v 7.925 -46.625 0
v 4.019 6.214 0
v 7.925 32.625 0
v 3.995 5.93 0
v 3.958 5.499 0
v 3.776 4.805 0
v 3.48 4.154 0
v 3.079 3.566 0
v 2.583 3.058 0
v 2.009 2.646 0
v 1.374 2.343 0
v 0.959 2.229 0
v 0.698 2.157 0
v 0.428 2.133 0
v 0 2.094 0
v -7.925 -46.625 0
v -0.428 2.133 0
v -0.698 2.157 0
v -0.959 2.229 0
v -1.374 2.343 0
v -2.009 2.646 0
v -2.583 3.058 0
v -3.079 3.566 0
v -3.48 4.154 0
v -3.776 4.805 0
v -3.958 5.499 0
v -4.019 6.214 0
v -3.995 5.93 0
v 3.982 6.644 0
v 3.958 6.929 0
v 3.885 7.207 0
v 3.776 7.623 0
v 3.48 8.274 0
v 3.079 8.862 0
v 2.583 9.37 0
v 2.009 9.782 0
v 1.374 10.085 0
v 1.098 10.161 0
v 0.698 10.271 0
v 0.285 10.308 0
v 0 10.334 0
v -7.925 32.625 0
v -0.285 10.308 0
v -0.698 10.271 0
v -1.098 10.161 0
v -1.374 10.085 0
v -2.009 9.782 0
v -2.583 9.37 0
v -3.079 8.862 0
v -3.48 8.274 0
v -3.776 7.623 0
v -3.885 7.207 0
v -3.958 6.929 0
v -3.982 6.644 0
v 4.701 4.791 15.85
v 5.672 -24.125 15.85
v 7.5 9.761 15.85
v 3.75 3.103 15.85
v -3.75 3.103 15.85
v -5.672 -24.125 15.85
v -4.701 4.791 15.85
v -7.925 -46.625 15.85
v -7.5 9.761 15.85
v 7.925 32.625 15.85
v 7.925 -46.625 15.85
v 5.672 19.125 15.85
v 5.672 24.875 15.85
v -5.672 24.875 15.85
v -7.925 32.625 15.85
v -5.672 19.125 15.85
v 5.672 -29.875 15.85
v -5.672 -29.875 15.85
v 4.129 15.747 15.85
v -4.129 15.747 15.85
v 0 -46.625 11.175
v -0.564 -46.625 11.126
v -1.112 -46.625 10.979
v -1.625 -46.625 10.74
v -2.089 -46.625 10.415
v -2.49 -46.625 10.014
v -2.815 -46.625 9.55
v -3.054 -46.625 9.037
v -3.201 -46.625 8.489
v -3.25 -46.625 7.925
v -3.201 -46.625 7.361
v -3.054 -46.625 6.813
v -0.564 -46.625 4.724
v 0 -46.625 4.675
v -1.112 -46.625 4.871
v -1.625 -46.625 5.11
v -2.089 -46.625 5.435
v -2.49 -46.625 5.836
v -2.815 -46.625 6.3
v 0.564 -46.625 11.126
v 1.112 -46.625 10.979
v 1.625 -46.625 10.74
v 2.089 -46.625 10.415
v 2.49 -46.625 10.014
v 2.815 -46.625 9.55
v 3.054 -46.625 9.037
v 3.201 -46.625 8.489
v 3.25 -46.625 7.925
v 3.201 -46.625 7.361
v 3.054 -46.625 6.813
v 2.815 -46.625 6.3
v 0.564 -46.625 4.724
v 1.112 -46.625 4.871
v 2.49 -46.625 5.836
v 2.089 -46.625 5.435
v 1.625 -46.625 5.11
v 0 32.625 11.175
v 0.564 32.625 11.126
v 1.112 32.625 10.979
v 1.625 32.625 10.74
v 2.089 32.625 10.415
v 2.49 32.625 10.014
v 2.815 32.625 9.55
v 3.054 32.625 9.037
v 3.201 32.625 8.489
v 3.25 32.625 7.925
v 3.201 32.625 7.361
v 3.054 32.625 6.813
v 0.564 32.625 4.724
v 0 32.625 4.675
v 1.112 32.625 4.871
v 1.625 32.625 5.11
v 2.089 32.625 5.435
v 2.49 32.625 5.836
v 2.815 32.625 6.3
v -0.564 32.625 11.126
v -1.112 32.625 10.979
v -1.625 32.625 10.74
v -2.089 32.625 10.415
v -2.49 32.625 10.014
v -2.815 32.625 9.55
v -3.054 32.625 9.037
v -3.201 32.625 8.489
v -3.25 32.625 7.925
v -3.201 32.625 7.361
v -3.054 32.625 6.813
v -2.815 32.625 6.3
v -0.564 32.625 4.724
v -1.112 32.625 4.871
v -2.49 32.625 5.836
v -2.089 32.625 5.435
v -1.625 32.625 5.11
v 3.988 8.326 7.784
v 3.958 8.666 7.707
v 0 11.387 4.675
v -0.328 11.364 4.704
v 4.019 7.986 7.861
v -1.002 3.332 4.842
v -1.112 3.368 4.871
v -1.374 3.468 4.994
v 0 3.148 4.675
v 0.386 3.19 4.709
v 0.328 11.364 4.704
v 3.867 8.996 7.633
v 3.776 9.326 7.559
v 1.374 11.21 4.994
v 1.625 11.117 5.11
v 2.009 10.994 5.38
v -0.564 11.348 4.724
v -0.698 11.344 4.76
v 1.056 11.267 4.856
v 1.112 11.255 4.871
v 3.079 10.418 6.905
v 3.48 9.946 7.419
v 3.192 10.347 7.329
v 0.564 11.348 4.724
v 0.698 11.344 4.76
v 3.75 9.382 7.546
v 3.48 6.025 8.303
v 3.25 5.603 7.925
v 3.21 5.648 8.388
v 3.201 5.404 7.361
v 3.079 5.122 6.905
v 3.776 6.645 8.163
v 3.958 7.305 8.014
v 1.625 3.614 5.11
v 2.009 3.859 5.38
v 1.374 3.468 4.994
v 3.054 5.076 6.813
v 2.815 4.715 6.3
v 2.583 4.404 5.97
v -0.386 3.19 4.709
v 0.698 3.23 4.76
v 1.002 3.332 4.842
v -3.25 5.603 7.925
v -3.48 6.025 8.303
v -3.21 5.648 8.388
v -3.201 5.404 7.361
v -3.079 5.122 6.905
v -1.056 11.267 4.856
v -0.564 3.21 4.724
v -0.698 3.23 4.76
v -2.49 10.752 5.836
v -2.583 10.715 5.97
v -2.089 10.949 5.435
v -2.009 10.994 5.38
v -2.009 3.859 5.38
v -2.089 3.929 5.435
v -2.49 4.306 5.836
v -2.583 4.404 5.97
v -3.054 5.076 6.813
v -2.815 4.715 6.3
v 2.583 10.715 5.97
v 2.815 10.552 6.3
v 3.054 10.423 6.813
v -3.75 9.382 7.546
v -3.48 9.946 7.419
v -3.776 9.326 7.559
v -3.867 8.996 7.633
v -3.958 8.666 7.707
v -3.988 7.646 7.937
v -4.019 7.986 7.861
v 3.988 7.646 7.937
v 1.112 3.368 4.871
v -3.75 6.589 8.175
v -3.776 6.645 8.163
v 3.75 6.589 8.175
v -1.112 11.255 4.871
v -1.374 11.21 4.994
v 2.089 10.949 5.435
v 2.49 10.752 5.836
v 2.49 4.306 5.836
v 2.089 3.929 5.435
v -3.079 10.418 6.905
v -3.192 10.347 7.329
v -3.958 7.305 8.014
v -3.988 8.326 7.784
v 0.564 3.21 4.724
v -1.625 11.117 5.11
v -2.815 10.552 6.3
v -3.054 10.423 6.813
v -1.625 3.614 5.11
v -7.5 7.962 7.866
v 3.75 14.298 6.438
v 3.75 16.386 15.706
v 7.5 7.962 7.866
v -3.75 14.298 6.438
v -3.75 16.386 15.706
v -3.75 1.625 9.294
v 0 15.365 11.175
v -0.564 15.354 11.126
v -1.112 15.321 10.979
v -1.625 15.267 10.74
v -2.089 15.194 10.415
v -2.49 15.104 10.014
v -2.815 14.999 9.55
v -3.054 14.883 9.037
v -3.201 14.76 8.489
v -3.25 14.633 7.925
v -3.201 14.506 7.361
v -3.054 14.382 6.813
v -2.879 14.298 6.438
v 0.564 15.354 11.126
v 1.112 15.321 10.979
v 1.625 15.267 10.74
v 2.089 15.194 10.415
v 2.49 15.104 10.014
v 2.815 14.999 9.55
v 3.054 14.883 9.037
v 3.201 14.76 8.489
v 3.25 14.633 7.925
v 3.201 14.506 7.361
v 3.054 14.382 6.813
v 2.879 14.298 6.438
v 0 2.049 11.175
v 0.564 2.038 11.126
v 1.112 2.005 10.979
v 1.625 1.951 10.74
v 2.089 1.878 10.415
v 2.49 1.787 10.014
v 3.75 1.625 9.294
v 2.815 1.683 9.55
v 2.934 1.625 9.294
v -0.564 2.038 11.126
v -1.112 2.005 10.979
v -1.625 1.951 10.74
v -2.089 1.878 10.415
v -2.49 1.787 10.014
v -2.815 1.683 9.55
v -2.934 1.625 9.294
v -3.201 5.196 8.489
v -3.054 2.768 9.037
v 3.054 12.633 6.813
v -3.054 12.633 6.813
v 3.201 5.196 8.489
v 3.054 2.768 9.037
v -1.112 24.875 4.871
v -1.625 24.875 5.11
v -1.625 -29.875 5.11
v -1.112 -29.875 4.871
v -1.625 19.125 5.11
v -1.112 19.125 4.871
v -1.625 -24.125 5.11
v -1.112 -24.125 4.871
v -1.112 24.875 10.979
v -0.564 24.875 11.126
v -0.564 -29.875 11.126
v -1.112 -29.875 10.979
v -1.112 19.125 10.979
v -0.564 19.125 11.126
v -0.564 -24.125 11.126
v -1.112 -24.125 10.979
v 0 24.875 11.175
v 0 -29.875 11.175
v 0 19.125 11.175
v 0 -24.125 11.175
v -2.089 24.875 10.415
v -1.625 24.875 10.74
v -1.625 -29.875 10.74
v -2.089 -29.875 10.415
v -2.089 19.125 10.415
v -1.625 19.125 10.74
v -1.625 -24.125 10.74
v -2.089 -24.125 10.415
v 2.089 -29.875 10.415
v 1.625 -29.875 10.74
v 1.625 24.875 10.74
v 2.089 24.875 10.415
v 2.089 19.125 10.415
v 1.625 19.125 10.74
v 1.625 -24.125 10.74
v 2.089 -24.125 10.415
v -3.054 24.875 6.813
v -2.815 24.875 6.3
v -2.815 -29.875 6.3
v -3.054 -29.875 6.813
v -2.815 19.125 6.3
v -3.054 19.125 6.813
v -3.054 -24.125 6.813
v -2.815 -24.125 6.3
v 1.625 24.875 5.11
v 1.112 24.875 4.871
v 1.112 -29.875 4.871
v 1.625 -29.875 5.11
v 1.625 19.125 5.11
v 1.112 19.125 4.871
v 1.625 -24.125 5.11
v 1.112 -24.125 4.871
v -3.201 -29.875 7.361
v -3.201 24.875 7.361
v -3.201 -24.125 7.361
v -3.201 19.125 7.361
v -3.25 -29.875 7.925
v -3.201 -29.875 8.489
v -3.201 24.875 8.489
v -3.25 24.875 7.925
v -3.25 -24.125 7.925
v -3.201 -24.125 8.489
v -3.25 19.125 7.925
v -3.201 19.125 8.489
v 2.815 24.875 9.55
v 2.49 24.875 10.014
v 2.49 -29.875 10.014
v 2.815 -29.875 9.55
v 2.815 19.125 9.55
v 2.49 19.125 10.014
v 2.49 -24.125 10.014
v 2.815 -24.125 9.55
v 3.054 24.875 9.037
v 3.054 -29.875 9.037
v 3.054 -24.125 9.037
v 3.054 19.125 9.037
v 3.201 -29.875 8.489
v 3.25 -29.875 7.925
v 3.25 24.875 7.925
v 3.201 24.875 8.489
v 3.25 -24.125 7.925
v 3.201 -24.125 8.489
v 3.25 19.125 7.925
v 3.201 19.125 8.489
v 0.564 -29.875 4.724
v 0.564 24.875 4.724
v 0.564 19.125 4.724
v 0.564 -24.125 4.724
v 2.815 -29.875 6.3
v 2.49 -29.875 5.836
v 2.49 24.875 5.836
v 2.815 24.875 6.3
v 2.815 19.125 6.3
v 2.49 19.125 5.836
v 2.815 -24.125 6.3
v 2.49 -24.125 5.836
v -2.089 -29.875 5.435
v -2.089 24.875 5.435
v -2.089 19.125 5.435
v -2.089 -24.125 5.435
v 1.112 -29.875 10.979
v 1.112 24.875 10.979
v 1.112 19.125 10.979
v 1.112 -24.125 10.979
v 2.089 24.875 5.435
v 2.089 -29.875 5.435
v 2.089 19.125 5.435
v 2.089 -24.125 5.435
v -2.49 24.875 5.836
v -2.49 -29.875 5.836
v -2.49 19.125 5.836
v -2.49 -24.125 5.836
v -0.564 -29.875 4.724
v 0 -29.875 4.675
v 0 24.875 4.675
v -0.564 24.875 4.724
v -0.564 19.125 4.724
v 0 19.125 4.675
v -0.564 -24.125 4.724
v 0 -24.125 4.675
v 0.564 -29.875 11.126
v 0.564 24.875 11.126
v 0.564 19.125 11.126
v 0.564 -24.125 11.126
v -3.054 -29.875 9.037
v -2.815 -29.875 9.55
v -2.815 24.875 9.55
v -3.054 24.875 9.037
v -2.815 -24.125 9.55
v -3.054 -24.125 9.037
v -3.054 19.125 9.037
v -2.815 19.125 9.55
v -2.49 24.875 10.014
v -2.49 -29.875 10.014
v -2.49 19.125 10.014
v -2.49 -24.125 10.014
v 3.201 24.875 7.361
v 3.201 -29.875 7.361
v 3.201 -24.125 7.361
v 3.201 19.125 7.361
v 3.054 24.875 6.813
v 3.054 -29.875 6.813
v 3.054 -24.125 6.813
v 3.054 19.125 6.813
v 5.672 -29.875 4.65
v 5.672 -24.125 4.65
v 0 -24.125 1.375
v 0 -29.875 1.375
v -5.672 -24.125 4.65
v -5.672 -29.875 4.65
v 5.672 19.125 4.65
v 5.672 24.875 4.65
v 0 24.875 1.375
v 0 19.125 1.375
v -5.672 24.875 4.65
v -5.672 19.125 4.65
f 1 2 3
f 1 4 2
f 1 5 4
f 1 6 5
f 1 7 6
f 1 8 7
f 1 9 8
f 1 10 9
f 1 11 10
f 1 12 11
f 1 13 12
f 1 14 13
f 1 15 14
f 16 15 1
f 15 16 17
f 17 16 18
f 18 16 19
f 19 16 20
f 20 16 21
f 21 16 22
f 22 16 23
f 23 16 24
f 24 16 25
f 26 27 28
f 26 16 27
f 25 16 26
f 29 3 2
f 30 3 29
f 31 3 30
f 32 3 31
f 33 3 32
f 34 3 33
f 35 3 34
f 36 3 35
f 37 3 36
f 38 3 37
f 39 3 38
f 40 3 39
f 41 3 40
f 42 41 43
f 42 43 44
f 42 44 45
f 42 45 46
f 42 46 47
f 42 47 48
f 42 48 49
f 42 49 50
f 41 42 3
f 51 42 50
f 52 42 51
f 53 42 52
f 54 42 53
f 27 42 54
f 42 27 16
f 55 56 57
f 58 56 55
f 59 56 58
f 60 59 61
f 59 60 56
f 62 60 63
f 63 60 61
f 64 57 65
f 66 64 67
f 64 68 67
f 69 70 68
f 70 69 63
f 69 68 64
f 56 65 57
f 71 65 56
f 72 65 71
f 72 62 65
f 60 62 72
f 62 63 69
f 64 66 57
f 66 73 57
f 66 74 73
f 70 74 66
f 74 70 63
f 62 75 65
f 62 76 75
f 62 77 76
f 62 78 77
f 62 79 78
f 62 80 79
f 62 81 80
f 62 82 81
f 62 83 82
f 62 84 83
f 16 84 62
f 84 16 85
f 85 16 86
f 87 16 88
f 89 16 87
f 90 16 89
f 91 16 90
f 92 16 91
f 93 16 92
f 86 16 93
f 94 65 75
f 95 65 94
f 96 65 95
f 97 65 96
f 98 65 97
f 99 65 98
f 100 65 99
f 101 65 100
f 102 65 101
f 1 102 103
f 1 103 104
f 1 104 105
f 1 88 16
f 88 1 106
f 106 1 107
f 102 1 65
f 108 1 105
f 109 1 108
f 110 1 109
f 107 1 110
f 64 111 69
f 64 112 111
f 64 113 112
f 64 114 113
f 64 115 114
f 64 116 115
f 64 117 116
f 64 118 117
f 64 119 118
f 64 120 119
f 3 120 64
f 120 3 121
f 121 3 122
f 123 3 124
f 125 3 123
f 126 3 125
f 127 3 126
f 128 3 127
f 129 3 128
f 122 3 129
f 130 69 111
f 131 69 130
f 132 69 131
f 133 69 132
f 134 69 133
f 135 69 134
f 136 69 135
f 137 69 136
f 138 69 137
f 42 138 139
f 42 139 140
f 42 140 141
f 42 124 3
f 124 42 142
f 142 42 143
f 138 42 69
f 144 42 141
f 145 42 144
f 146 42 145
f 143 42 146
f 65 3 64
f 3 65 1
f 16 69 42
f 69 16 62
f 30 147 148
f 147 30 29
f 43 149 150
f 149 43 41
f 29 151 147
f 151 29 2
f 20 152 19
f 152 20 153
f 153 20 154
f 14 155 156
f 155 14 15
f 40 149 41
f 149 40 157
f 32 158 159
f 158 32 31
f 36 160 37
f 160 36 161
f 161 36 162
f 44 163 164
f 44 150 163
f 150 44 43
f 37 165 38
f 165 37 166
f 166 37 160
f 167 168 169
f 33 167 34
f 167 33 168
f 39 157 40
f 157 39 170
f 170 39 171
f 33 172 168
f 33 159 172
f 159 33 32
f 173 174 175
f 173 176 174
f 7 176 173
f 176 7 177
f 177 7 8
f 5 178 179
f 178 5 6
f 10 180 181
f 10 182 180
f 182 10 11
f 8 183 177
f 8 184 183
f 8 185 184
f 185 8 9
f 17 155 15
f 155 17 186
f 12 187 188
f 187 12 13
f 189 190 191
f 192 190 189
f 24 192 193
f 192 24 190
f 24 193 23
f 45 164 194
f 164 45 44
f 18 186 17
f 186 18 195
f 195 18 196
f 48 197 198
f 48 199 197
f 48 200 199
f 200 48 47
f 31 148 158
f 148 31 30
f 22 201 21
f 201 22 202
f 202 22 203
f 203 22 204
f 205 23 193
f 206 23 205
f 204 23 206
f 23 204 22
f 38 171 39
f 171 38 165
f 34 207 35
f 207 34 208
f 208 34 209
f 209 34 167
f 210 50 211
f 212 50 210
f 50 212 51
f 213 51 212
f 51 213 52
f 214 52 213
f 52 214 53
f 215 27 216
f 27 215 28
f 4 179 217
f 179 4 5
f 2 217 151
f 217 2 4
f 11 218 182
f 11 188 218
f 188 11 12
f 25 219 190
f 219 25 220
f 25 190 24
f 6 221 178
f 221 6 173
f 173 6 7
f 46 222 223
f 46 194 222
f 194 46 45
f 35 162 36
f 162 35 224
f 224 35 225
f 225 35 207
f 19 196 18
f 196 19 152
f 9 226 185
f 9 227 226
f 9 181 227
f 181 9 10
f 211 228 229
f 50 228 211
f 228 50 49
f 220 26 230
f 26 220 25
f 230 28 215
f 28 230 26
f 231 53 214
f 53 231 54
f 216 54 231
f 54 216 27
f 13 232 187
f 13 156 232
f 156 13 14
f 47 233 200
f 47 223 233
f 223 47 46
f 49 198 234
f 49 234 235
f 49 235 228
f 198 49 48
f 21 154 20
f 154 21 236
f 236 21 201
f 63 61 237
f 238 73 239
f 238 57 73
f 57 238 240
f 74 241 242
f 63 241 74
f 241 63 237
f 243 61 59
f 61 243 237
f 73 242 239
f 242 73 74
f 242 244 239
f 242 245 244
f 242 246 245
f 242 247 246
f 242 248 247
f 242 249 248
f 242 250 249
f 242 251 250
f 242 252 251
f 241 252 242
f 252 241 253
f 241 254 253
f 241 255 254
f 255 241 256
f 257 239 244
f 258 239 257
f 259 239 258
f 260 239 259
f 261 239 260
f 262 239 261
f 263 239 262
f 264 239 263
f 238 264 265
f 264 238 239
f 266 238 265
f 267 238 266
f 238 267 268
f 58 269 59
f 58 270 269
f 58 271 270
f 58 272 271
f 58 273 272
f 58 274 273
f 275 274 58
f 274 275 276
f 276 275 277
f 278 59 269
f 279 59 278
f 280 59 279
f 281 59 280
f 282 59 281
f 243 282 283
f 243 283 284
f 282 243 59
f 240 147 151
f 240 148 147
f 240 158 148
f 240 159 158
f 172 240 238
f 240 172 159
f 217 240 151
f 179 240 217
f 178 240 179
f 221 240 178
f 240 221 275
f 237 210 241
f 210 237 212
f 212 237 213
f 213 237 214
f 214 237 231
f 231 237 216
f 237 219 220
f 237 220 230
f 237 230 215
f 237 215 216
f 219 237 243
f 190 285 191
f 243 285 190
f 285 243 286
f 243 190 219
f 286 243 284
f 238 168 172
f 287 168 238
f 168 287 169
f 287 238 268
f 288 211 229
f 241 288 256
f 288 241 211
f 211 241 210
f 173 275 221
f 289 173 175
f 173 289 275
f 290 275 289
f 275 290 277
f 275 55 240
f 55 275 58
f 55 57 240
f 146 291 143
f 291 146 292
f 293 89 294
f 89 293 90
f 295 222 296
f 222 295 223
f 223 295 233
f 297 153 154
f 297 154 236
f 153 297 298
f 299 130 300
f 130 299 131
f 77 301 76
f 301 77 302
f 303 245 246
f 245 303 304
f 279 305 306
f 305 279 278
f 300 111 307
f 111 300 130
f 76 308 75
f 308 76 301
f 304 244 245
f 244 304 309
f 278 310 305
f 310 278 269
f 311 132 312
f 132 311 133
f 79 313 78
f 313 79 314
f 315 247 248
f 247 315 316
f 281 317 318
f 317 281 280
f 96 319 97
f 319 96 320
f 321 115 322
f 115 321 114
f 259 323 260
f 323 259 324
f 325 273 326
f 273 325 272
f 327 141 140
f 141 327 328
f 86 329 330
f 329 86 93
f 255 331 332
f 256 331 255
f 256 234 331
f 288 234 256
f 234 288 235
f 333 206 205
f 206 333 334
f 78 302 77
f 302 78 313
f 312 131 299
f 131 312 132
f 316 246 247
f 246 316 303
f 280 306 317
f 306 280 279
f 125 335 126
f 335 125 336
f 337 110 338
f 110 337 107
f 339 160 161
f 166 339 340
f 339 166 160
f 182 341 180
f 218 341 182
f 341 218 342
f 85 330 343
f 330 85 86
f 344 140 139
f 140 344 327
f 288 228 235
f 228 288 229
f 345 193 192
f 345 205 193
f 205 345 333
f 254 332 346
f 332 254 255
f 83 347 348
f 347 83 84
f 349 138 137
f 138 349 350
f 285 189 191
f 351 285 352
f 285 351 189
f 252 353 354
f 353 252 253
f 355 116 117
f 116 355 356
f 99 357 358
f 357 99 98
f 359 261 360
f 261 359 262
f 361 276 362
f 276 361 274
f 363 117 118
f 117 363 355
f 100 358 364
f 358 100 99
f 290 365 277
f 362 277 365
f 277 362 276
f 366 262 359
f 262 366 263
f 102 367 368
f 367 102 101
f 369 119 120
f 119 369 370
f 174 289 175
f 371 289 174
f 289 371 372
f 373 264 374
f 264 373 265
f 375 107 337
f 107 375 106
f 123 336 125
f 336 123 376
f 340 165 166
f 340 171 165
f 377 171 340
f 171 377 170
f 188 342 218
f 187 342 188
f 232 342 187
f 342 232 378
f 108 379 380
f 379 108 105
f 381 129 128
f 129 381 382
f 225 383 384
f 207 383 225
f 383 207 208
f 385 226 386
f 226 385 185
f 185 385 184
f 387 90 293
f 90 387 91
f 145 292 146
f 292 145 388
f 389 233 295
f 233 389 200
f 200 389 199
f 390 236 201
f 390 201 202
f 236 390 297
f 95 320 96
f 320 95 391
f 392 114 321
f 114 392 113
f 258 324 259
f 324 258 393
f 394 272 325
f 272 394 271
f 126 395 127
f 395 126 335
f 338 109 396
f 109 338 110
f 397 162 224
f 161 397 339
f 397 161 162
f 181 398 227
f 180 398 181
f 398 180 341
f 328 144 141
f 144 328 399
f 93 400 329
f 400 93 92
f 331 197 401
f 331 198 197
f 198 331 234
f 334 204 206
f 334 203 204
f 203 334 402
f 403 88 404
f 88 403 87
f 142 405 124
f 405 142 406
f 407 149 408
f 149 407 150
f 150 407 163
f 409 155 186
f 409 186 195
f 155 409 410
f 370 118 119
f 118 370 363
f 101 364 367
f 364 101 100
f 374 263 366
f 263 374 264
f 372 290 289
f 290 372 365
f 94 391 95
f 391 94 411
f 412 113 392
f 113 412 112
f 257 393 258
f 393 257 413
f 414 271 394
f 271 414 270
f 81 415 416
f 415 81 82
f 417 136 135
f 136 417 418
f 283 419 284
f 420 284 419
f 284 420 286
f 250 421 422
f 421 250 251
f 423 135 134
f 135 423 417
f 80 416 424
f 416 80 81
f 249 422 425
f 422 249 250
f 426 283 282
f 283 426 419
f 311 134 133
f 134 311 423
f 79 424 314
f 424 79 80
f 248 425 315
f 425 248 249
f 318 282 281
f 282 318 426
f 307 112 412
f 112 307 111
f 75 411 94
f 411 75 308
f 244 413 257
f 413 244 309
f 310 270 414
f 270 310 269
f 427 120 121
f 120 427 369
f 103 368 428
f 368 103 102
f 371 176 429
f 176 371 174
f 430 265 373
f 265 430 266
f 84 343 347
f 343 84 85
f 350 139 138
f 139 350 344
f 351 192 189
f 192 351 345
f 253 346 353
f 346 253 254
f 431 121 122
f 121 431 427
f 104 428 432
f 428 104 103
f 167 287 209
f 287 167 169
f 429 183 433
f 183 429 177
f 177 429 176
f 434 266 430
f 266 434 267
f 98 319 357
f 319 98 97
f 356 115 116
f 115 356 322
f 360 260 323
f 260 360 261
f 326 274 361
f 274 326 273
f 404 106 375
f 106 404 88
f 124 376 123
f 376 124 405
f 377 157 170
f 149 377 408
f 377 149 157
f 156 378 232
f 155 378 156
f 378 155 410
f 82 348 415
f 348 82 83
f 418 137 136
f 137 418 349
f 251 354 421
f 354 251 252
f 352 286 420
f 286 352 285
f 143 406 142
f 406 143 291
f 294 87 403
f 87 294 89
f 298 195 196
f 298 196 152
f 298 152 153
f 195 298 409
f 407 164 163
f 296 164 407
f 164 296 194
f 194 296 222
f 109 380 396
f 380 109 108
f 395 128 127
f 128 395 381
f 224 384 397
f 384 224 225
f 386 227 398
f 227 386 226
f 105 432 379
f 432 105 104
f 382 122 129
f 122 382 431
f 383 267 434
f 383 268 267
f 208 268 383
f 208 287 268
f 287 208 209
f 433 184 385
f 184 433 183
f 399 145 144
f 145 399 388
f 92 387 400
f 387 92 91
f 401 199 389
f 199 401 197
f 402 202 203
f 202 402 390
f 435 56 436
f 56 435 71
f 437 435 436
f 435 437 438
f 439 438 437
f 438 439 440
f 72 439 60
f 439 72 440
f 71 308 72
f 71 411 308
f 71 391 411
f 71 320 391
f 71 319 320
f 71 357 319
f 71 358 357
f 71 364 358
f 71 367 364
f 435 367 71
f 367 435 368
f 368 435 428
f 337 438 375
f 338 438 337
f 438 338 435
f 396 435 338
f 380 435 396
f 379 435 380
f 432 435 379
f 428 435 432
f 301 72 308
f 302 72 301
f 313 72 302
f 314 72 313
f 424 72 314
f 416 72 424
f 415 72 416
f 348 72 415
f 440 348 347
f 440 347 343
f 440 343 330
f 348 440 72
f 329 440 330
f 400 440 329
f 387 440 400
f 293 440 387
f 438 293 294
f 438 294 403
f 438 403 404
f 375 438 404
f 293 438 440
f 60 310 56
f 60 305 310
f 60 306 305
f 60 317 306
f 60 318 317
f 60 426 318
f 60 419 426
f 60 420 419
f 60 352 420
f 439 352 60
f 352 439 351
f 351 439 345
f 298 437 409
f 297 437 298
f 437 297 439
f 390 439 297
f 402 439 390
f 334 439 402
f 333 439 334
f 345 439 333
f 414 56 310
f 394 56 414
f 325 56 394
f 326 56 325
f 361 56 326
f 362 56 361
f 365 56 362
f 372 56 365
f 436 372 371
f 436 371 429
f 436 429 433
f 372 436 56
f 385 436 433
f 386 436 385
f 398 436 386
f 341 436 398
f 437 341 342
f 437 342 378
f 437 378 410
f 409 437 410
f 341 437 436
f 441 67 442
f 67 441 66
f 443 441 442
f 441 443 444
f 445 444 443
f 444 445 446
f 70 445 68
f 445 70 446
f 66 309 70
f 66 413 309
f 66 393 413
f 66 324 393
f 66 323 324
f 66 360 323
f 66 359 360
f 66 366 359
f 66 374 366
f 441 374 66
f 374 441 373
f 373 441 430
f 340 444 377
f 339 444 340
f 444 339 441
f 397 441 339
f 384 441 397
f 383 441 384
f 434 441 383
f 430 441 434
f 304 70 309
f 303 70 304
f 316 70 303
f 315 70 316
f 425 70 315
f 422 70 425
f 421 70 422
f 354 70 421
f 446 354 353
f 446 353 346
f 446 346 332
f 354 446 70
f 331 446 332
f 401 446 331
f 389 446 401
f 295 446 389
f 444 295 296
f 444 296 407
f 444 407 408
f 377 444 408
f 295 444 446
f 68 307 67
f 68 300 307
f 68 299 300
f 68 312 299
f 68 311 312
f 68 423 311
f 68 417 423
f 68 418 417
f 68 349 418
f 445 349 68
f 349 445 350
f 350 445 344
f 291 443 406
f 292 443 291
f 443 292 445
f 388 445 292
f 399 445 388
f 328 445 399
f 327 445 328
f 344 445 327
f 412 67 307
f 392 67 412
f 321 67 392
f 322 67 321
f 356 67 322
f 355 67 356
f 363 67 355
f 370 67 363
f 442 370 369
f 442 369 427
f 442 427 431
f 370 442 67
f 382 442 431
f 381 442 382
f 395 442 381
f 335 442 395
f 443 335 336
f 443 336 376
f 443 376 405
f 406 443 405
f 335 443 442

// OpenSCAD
// inside 16.5mm (interior) aluminium bar,
// 1/4in nuts insert to let 1/4in bolts hug 5/16in rod
// perhaps epoxy the whole thing in place...


interior=15.85;
echo("interior dimension of square-tube =", interior);
rods=(5/16)*25.4+.1;
rodsnut=7.5;
echo("angled rods diameter =", rods, " nut radius=", rodsnut);
grip=(1/4)*25.4+.15;
gripnut= 6.55;
echo("gripper bolt diameter=", grip, " nut radius=", gripnut);

module barRod(ang=12.7){
	echo("incident angle of rod=",ang, "deg");
	nutH = 6.7;
	nutoff=sin(ang)*(interior/2 - nutH/2);
	difference(){
	translate([-0,-7,0]) rotate([90,0,0])
		cube([interior,interior,interior*5], center=true);

	translate([0,8,0]) rotate([ang,90,0])
		cylinder(r=rods/2, h=interior*5, center=true, $fn=36);
	translate([(interior/2 - nutH/2),8-nutoff,0]) rotate([ang,90,0])
		cylinder(r=rodsnut, h=9.5, center=true, $fn=6);
	translate([0,-7,0]) rotate([90,0,0])
		cylinder(r=grip/2, h=interior*5, center=true, $fn=36);
	hull(){
		translate([0,-27,0]) rotate([90,0,0])
			cylinder(r=gripnut, h=5.75, center=true, $fn=6);
		translate([12,-27,0]) rotate([90,0,0])
			cylinder(r=gripnut, h=5.75, center=true, $fn=6);
	}
	hull(){
		translate([0,22,0]) rotate([90,0,0])
			cylinder(r=gripnut, h=5.75, center=true, $fn=6);
		translate([12,22,0]) rotate([90,0,0])
			cylinder(r=gripnut, h=5.75, center=true, $fn=6);
	}
	}
}

translate([0,0,interior/2]) rotate([0,-90,0])
barRod(-12.7);
